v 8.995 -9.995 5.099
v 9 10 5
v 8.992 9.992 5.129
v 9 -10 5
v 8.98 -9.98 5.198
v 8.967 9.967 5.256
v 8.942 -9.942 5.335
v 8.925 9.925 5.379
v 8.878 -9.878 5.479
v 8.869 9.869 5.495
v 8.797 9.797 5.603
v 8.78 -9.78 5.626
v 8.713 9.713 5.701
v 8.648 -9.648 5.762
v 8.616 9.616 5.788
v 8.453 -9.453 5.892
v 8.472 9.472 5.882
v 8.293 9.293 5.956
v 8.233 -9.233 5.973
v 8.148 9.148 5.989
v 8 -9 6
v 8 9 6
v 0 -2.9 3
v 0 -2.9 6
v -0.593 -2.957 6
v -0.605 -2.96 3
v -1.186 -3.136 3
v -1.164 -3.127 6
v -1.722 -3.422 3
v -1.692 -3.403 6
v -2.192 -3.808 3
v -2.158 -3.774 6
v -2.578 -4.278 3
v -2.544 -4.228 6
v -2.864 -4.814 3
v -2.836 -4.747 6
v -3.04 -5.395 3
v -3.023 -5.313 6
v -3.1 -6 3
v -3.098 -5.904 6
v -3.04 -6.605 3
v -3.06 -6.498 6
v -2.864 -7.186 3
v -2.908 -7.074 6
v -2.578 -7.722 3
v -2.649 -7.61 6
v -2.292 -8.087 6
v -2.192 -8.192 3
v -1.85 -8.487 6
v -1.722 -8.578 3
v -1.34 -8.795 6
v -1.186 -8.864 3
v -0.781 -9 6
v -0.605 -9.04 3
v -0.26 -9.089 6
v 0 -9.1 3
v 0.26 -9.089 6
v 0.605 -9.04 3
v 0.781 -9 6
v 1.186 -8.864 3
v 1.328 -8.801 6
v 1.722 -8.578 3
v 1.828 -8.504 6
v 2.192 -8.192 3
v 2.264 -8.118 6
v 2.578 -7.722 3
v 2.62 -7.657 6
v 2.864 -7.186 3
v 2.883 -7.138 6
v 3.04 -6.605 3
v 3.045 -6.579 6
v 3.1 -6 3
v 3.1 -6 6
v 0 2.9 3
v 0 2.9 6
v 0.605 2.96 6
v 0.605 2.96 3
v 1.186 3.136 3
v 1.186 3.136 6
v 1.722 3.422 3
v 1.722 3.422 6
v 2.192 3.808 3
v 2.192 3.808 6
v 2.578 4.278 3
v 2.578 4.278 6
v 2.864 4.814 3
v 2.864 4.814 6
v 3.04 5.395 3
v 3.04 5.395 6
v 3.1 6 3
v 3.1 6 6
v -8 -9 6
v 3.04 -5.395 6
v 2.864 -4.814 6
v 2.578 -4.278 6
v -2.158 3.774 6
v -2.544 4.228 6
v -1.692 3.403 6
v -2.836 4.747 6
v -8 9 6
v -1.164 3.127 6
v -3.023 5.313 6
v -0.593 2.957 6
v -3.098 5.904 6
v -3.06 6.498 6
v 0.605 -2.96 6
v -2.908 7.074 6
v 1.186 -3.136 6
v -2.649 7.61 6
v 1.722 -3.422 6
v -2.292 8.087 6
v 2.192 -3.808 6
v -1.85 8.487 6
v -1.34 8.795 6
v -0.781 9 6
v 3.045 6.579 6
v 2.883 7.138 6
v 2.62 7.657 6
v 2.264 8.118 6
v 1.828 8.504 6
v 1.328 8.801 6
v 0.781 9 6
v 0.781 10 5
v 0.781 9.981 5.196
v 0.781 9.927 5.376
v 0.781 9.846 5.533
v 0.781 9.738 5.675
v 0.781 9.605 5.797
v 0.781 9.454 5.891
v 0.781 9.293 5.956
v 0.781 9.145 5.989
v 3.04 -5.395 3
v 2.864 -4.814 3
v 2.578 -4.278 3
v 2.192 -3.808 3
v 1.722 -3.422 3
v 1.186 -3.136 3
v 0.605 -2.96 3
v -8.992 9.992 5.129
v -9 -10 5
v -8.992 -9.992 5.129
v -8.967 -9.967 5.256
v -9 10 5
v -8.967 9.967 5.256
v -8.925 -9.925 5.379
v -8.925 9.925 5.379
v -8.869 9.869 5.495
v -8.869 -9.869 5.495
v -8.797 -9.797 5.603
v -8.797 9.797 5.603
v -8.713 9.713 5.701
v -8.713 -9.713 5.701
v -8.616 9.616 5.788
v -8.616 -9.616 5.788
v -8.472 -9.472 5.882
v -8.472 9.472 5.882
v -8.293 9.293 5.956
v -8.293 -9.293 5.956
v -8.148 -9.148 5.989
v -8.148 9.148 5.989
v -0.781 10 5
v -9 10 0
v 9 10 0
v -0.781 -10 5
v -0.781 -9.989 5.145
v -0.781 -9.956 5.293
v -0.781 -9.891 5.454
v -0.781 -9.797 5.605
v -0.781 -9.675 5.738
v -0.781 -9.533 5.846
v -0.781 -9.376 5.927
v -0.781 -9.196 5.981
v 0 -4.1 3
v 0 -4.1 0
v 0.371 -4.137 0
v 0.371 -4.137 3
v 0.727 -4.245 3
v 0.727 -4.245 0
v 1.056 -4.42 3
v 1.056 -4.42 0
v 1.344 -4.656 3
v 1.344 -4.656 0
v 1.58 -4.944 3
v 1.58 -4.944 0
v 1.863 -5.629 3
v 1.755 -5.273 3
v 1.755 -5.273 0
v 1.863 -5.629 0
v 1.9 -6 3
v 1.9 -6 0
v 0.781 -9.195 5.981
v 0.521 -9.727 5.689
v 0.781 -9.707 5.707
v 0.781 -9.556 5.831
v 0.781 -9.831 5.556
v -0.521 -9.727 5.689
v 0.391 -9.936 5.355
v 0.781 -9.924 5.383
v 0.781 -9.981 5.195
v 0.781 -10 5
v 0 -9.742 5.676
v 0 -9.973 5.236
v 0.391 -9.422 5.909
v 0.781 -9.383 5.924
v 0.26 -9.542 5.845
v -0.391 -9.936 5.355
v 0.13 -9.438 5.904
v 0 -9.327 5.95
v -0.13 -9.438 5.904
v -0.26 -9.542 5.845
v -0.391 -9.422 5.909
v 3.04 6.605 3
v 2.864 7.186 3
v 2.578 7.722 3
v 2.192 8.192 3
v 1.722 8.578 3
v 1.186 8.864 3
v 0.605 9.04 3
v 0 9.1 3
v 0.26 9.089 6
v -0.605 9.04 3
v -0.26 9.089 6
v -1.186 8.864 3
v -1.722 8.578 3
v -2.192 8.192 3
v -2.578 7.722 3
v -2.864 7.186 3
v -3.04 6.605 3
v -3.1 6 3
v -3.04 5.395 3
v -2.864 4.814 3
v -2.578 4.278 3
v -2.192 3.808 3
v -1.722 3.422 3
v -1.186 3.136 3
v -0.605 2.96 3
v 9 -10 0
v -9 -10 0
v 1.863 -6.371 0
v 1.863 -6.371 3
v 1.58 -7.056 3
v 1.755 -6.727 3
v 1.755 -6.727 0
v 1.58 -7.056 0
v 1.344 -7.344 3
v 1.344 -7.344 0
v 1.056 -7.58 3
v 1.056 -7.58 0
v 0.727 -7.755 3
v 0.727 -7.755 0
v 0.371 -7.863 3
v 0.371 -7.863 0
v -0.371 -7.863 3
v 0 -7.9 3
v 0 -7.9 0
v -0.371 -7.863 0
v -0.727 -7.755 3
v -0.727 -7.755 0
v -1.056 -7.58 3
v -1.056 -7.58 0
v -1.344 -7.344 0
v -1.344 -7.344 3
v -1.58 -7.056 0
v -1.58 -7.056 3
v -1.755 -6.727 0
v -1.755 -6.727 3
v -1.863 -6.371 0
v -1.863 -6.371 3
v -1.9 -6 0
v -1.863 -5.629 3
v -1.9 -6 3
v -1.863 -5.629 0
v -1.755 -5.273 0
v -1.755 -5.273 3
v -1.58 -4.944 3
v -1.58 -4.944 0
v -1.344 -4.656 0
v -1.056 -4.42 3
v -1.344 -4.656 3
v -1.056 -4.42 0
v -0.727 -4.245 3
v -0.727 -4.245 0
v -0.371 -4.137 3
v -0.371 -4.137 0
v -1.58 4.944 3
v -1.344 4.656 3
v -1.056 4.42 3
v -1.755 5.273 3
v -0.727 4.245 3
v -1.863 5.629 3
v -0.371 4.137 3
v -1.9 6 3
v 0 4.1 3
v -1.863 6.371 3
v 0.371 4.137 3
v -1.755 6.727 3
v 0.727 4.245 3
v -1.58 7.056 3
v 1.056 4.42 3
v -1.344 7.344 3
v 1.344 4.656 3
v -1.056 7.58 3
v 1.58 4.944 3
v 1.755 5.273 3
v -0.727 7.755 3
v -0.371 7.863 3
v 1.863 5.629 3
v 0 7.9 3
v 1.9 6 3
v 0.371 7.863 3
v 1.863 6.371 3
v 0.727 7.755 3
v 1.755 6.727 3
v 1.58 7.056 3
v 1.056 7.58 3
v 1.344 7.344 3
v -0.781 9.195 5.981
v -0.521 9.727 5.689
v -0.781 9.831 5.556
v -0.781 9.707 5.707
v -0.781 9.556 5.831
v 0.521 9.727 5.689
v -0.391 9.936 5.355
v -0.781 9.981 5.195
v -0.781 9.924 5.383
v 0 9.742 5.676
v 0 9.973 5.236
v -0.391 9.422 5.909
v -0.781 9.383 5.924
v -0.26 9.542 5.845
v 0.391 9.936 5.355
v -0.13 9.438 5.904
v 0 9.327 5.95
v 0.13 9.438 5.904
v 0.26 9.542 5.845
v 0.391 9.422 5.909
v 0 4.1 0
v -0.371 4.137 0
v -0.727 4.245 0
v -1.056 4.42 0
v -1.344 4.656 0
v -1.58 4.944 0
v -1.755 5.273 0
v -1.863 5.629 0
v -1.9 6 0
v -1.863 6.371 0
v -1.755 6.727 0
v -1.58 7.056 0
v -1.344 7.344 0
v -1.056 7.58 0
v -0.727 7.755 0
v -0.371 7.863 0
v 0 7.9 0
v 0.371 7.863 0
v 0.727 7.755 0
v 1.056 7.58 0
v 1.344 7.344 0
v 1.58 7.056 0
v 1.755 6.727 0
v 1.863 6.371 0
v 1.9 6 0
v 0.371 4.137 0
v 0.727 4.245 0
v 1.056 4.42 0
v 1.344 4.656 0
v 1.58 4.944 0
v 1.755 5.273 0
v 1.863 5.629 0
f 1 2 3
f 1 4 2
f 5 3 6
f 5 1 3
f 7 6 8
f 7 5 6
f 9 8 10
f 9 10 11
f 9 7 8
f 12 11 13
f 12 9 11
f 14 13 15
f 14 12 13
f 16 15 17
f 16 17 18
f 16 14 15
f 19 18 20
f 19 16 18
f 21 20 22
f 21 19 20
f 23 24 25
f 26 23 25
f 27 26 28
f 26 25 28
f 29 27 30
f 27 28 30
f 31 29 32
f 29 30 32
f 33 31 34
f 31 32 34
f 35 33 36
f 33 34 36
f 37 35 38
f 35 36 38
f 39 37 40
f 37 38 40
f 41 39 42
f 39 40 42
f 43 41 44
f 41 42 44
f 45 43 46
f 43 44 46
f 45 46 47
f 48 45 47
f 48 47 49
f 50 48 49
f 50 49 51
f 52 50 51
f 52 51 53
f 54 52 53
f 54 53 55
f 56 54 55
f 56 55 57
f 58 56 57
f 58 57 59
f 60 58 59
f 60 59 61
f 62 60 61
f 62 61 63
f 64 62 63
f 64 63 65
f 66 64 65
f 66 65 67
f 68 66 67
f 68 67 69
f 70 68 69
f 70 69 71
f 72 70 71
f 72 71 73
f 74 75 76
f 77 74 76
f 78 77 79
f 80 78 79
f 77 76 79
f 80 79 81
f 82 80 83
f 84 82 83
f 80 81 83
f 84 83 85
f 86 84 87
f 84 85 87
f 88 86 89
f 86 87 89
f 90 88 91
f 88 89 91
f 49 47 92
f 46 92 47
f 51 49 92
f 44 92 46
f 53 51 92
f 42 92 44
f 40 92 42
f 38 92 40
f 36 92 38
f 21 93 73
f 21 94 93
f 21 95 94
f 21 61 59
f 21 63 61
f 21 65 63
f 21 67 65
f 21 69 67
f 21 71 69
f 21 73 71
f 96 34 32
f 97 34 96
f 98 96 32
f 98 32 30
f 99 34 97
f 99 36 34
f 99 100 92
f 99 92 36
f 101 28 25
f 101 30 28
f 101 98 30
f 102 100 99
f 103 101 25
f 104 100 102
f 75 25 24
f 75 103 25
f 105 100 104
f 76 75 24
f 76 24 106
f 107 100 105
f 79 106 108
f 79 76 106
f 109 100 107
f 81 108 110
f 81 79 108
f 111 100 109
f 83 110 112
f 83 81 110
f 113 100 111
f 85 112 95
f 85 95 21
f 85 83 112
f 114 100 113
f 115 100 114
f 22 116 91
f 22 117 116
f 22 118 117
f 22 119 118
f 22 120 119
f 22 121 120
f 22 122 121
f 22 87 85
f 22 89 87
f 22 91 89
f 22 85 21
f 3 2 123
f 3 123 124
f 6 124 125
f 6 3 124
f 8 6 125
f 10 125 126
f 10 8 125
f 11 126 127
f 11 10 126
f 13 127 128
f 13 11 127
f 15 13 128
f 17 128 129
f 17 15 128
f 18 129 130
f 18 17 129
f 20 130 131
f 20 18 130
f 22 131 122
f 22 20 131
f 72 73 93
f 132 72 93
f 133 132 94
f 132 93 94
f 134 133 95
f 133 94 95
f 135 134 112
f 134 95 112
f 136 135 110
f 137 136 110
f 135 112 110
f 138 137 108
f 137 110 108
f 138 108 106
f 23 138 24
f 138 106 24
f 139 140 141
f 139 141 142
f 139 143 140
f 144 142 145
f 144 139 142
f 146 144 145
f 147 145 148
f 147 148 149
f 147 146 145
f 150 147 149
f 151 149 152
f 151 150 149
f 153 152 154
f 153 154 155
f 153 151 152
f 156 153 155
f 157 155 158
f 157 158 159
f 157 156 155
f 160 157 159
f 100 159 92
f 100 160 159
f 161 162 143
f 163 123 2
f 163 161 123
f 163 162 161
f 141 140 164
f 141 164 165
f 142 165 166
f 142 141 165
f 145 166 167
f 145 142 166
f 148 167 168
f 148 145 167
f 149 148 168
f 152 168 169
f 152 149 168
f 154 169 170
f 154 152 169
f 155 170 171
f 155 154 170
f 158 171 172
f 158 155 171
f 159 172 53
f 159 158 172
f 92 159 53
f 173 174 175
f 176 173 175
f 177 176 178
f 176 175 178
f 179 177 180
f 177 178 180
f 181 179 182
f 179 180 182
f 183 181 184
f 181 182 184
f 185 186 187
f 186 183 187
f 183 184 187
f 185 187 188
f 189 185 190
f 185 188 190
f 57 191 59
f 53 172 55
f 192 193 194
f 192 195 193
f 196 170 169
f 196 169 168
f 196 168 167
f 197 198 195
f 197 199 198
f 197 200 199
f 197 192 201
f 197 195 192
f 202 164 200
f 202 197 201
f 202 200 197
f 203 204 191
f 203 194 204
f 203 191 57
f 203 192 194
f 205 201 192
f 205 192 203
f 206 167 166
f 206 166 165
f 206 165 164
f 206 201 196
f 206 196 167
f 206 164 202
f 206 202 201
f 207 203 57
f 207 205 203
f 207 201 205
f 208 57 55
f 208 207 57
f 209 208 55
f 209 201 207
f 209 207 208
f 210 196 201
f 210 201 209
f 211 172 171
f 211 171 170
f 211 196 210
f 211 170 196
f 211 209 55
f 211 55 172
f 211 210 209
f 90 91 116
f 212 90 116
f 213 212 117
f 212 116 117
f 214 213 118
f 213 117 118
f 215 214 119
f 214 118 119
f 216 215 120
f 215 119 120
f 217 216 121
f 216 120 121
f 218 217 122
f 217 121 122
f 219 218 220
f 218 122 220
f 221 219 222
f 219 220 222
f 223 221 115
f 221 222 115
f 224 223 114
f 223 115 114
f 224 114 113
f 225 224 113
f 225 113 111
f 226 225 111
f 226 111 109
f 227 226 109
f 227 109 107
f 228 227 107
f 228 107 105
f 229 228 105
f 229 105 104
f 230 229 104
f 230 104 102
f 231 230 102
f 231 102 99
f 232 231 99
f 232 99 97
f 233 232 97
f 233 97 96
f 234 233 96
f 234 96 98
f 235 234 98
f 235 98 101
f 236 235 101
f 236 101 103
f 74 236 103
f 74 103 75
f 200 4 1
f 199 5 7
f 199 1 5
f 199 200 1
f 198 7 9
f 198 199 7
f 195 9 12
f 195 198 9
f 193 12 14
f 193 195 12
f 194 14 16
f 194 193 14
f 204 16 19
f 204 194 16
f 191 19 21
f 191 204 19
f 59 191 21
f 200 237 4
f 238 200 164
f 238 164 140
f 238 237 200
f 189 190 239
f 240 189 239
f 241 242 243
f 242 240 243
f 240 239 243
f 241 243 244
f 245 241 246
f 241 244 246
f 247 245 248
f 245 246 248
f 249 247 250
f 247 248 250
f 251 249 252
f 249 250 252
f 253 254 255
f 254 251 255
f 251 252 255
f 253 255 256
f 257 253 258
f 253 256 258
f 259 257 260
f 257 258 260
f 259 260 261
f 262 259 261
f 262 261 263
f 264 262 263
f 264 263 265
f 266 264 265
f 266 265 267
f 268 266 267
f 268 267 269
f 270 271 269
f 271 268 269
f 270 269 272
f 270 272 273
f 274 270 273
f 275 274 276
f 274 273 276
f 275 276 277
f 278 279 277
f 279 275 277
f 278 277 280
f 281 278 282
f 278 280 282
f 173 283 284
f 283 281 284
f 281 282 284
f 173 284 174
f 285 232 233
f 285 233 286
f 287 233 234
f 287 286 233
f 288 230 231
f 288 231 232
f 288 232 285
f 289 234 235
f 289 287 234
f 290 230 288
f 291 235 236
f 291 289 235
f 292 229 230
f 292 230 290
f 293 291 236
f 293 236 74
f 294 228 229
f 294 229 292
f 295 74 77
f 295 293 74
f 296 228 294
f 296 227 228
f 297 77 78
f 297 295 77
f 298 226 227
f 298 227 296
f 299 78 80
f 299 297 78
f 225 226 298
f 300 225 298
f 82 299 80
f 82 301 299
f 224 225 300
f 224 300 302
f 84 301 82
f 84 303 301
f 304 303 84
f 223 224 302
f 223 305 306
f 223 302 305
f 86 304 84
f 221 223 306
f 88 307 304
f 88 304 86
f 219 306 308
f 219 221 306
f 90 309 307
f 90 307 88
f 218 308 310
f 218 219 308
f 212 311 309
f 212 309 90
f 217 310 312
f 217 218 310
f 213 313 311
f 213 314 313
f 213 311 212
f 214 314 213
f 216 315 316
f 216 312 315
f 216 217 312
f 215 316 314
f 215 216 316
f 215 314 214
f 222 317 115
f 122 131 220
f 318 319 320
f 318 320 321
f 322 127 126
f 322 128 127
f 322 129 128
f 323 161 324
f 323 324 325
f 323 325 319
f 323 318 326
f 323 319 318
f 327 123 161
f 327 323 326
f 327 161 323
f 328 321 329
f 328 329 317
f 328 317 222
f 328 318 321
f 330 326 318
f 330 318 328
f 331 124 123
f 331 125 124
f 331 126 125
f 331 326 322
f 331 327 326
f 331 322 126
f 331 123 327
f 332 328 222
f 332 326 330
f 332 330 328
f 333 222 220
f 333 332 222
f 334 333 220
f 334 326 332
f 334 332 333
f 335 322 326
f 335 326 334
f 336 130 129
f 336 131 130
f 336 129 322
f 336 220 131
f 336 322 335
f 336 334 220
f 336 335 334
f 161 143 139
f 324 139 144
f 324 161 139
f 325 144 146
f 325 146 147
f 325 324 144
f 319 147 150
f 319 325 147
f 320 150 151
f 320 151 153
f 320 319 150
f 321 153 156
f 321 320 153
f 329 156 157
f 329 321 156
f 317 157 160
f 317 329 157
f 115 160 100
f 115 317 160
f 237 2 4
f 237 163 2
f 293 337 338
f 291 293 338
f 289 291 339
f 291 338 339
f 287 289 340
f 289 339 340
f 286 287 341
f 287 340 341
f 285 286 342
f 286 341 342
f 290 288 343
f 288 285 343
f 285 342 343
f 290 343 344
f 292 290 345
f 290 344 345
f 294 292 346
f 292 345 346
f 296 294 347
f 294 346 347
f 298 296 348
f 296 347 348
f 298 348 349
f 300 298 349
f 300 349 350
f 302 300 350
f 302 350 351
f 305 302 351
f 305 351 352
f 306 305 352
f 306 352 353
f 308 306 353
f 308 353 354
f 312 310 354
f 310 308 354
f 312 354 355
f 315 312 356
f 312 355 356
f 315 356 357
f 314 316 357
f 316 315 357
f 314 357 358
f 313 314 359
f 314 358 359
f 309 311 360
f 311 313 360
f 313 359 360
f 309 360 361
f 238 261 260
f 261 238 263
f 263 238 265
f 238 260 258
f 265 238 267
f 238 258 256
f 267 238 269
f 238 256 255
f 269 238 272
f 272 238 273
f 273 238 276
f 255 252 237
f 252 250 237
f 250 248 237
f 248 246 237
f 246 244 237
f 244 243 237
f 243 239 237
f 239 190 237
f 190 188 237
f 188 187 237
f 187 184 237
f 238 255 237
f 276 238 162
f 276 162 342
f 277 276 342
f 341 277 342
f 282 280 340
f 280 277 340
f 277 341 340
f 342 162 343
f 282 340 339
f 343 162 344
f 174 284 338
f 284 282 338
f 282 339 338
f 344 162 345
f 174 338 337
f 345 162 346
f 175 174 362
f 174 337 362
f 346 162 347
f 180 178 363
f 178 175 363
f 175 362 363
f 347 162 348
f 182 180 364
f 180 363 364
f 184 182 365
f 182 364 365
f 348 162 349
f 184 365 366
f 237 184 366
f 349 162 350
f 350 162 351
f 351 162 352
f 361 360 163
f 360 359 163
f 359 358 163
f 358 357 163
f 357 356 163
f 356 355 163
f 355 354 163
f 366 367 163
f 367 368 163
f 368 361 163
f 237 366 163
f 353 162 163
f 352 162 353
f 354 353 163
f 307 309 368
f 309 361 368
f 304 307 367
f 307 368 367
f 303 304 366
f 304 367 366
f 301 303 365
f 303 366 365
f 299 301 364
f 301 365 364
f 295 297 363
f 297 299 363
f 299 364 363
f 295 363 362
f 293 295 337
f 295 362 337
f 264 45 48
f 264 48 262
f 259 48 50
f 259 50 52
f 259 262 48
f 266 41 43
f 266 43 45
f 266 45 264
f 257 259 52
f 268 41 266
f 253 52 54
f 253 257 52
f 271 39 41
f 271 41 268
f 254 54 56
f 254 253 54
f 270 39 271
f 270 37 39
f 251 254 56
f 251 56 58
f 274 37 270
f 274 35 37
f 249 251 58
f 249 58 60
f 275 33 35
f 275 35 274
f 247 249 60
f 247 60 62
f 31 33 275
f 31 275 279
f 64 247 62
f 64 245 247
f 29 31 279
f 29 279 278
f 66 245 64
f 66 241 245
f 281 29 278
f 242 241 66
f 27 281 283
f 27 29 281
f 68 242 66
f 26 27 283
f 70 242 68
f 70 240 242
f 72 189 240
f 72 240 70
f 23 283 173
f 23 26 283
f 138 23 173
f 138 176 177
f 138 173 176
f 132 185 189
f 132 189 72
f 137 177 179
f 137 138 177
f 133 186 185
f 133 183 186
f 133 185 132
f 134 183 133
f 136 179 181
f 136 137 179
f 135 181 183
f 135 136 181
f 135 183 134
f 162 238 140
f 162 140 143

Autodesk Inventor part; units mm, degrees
ref_plane "YZ Plane" through (0, 0, 0) normal (1, 0, 0) x (0, 1, 0)
ref_plane "XZ Plane" through (0, 0, 0) normal (0, 1, 0) x (-1, 0, 0)
ref_plane "XY Plane" through (0, 0, 0) normal (0, 0, 1) x (1, 0, 0)
sketch "Sketch1" plane through (0, 0, 0) normal (0, 0, 1) x (1, 0, 0)
  line L0 (-9, 10) -> (9, 10)
  line L1 (9, 10) -> (9, -10)
  line L2 (9, -10) -> (-9, -10)
  line L3 (-9, -10) -> (-9, 10)
  line L4 (-9, 10) -> (9, -10) construction
  line L5 (9, 10) -> (-9, -10) construction
  line L6 (0, 0) -> (0, 6)
  line L7 (0, 0) -> (0, -6)
  circle A0 centre (0, 6) radius 1.9
  circle A1 centre (0, -6) radius 1.9
  dimension "d0" = 18
  dimension "d1" = 20
  dimension "d2" = 6
  dimension "d3" = 6
  dimension "d4" = 3.8
  dimension "d5" = 3.8
extrude "Extrusion1" add sketch "Sketch1" along normal blind 6
sketch "Sketch2" plane through (0, 0, 6) normal (0, 0, 1) x (1, 0, 0)
  circle A0 centre (0, 6) radius 1.9 projected
  circle A1 centre (0, 6) radius 3.1
  circle A2 centre (0, -6) radius 1.9 projected
  circle A3 centre (0, -6) radius 3.1
  point P0 (0, 0)
  dimension "d8" = 6.2
  dimension "d9" = 6.2
extrude "Extrusion2" cut sketch "Sketch2" against normal blind 3
fillet "Fillet1" radius 1 4 edges at (0, 10, 6) (-9, 0, 6) (0, -10, 6) (9, 0, 6)
properties part number "ChassisLegV1"
